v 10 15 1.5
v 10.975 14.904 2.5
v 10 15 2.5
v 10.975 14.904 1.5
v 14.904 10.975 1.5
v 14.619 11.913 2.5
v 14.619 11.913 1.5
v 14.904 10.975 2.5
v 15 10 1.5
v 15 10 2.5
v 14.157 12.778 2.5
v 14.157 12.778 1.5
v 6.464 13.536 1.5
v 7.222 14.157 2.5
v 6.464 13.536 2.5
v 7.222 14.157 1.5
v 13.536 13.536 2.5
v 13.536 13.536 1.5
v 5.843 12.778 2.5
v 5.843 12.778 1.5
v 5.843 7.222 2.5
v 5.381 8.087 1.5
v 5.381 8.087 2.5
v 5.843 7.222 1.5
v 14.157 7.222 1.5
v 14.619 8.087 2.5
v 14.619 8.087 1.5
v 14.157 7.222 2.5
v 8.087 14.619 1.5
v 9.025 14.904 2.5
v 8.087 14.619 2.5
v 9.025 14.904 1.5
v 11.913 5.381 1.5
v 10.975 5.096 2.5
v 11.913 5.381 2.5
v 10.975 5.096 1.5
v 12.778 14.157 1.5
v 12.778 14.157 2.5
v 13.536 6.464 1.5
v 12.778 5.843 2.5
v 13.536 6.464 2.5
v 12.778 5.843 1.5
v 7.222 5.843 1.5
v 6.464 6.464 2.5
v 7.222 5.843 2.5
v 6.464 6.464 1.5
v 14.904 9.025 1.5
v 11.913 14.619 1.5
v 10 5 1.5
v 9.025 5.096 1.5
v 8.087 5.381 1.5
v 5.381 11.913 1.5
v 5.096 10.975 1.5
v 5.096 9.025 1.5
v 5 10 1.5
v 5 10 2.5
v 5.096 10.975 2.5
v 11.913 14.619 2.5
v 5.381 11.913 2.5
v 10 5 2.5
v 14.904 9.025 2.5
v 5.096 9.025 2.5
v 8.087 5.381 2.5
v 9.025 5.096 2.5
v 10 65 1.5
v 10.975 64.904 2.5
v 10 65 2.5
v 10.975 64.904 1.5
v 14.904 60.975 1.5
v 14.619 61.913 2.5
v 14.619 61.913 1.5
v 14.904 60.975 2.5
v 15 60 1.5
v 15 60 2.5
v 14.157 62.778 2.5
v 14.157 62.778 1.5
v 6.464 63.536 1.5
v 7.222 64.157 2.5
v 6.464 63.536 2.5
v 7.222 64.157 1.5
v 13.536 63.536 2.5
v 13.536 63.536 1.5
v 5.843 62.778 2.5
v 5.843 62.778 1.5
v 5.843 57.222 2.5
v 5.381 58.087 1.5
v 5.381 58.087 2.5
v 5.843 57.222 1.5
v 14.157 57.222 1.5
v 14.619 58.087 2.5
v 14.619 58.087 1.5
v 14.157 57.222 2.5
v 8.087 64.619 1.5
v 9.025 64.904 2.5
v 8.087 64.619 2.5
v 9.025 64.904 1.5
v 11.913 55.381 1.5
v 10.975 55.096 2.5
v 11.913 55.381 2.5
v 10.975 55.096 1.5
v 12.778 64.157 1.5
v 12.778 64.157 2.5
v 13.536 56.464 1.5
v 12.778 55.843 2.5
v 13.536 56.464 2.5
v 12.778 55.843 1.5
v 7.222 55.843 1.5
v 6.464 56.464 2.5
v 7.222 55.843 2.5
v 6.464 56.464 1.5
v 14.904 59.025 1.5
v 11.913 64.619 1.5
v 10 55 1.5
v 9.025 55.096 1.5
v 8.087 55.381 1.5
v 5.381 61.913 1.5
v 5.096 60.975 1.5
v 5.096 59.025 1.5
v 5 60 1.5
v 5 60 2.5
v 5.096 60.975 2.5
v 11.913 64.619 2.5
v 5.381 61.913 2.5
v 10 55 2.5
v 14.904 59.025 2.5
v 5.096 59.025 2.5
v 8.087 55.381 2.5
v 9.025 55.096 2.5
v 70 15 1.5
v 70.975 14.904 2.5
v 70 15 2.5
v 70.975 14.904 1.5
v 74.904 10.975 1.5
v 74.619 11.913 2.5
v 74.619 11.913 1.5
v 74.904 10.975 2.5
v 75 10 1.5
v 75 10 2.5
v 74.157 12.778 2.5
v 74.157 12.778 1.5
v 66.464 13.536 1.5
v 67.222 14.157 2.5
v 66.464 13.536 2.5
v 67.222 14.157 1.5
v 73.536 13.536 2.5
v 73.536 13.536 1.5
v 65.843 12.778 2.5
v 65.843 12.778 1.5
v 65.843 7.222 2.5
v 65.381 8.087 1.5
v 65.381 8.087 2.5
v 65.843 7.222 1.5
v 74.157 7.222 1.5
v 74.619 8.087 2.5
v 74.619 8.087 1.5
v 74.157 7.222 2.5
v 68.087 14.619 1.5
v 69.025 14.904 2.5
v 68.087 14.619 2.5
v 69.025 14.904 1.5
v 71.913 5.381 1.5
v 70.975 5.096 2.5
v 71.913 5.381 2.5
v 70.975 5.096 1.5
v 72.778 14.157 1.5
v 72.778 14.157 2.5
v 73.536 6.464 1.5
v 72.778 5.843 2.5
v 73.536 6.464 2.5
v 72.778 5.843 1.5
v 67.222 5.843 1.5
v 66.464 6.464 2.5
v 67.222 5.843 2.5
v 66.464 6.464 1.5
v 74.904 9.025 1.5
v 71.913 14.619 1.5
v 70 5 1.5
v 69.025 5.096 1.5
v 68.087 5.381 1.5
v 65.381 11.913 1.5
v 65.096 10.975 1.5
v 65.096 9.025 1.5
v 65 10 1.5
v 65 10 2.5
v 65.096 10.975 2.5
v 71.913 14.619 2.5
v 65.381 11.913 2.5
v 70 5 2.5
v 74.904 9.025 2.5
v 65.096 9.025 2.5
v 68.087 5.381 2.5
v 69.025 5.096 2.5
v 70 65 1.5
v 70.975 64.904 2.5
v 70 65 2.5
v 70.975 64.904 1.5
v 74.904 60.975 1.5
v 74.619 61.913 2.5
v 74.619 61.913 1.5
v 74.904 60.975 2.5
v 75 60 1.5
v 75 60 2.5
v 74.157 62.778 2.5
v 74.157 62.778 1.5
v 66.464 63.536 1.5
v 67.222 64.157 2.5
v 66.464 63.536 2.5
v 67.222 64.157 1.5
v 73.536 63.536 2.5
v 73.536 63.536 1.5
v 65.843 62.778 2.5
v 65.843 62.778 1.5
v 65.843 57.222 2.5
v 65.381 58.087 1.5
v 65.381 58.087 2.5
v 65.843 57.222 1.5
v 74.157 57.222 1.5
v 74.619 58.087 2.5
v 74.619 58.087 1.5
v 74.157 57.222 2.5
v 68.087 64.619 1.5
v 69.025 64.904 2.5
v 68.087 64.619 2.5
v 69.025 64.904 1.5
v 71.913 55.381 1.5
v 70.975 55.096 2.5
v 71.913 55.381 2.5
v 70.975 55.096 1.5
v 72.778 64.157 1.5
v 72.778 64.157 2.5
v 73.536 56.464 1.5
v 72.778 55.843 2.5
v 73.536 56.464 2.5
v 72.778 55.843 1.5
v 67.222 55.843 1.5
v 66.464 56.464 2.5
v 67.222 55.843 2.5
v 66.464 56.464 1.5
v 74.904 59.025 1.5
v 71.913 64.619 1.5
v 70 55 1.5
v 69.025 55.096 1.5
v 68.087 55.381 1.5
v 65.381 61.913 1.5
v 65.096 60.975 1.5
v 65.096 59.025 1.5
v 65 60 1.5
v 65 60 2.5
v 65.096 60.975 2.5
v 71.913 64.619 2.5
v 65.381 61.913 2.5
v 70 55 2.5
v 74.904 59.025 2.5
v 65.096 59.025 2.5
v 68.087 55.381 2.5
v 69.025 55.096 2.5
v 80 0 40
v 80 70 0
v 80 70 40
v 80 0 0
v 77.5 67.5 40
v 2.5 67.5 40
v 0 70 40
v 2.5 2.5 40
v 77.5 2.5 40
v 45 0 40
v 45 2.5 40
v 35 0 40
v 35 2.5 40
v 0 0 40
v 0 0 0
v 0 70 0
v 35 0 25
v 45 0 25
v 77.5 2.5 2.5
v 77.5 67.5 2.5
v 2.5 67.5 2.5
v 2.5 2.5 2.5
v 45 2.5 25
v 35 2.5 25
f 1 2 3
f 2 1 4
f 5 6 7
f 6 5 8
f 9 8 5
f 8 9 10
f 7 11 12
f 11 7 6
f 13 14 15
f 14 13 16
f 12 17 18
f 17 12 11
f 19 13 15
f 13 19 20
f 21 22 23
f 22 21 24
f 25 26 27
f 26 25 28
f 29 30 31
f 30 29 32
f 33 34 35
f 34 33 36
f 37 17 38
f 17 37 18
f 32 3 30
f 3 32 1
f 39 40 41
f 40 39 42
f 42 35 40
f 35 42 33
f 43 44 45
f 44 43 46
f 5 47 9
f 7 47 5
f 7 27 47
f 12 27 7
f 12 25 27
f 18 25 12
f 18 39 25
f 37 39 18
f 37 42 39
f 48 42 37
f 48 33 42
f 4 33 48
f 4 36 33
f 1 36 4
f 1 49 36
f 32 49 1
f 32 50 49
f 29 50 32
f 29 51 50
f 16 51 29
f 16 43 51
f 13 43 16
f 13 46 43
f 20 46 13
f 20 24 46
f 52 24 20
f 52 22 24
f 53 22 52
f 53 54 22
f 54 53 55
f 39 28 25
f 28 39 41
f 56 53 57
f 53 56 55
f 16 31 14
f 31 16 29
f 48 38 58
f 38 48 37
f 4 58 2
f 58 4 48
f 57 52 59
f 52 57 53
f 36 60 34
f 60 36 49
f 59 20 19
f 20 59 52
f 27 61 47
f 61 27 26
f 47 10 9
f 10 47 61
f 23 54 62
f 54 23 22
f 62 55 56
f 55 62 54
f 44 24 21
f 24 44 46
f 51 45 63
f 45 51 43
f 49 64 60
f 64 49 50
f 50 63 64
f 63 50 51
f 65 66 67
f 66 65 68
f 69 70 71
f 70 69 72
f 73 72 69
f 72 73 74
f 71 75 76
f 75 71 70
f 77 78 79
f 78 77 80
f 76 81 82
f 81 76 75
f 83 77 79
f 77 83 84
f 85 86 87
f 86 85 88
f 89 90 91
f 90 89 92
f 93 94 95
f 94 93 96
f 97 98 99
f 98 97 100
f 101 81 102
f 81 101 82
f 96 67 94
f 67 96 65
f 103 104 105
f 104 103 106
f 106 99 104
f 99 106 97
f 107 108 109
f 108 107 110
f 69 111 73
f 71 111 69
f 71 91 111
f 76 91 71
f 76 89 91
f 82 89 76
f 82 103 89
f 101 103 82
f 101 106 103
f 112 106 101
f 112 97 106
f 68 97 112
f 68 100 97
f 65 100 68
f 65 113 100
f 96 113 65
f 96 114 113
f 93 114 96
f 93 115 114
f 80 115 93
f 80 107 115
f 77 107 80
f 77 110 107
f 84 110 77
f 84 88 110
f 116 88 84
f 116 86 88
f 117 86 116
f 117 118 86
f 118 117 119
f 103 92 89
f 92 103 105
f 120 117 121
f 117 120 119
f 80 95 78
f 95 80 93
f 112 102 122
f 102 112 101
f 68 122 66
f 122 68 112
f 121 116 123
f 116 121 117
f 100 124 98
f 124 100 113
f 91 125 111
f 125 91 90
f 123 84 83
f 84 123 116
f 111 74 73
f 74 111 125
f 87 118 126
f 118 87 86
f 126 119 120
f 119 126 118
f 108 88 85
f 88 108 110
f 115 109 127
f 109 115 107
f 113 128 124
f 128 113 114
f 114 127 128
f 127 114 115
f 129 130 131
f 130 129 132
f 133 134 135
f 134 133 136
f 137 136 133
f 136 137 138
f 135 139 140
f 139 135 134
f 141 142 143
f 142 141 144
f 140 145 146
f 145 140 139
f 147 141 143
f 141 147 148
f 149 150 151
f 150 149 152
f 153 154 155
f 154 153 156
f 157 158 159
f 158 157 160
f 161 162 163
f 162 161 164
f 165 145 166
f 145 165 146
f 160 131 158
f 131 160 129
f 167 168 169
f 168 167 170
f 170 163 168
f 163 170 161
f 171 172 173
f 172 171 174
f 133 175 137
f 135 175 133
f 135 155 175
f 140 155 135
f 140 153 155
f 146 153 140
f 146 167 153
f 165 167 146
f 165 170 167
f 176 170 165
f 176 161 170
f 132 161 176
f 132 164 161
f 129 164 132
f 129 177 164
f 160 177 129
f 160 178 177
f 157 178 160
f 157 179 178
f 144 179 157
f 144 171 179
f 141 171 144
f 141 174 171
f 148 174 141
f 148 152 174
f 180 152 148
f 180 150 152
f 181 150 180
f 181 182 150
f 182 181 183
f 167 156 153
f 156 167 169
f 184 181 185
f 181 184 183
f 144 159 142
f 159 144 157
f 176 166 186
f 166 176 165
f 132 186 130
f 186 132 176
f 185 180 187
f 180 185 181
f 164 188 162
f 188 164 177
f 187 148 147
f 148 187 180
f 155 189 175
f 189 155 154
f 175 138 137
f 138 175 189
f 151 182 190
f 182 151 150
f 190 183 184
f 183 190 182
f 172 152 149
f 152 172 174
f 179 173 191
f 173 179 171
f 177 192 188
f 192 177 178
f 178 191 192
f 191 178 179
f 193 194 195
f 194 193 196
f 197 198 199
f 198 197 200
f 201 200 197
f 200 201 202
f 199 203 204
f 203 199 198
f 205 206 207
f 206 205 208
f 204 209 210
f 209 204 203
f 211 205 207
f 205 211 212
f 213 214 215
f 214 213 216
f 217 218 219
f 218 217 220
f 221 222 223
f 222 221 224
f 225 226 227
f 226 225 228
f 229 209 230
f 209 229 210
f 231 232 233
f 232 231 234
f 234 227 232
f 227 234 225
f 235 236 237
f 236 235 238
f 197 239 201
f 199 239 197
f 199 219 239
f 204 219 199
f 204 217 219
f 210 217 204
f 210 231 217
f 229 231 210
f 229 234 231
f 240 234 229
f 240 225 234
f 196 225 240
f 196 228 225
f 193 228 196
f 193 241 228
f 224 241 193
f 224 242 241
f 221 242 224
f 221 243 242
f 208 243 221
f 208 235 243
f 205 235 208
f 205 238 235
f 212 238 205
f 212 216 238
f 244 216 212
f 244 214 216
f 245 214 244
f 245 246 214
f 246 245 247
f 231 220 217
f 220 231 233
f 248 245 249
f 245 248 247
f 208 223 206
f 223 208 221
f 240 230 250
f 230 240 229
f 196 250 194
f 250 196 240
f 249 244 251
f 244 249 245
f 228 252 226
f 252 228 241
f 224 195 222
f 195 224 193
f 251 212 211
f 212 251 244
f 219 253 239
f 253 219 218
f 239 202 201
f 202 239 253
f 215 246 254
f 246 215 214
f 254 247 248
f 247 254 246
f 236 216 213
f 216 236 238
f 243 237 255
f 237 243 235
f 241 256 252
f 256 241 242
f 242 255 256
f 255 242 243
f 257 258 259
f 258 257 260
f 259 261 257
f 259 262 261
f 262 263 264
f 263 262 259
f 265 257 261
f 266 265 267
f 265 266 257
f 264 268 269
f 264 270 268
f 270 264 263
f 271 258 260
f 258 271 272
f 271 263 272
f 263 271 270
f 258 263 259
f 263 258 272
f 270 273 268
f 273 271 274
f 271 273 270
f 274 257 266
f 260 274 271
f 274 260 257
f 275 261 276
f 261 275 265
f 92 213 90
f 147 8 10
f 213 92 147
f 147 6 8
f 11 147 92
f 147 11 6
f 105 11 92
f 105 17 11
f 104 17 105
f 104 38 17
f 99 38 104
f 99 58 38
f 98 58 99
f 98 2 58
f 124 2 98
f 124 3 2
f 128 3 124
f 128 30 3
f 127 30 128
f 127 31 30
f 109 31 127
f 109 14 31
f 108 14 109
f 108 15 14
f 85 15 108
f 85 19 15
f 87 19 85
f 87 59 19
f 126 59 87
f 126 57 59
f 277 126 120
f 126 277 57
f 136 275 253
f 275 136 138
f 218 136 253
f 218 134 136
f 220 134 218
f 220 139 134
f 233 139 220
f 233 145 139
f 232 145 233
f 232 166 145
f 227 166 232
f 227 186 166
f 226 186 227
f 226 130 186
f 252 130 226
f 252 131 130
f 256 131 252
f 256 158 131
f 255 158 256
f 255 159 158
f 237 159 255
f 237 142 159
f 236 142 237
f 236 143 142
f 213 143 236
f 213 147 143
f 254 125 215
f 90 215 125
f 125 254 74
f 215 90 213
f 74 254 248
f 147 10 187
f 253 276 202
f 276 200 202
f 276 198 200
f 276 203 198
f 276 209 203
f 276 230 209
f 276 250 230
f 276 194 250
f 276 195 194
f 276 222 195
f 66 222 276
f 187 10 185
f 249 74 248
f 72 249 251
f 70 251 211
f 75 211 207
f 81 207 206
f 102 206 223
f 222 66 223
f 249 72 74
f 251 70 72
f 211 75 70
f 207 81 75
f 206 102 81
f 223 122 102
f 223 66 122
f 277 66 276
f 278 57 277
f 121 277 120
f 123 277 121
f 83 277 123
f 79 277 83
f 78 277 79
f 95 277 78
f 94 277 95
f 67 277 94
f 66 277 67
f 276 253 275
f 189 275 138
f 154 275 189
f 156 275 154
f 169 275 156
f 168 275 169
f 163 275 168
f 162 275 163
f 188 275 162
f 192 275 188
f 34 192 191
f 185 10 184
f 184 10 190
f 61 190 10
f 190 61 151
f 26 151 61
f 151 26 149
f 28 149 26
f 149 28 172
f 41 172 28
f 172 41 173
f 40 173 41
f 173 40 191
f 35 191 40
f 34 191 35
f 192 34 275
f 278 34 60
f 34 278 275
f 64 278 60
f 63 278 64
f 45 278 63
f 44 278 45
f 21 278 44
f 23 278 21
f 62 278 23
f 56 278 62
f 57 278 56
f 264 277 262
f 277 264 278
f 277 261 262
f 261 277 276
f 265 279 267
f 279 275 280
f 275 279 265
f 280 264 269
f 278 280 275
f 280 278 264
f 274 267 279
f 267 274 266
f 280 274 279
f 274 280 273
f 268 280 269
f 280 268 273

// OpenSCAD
$fn = 32;

// ----------------------------------------------------------------------
// Enclosure box: both enclosure
// ----------------------------------------------------------------------

// --- parameters (mm) ---
box_l = 80;               // outer length, X
box_w = 70;               // outer width, Y
box_h = 40;               // outer height
wall_t = 2.5;             // wall thickness
boss_r = 5;               // corner boss radius
hole_r = 2;               // boss screw hole radius
boss_in = 10;             // boss inset from the corners
notch_w = 10;             // cable notch width
notch_h = 15;             // cable notch height

inner_h = box_h - wall_t;  // cavity depth
boss_h = inner_h - 2;  // corner boss height

difference() {
  cube([box_l, box_w, box_h]);
  translate([wall_t, wall_t, wall_t])
    cube([box_l - 2 * wall_t, box_w - 2 * wall_t, box_h]);
  for (sx = [0, 1], sy = [0, 1])
    translate([sx ? box_l - boss_in : boss_in,
               sy ? box_w - boss_in : boss_in, wall_t - 1]) {
      cylinder(r = boss_r, h = boss_h);
      translate([0, 0, boss_h - 4])
        cylinder(r = hole_r, h = 5);
    }
  translate([box_l / 2 - notch_w / 2, -1, box_h - notch_h])
    cube([notch_w, wall_t + 2, notch_h + 1]);
}
